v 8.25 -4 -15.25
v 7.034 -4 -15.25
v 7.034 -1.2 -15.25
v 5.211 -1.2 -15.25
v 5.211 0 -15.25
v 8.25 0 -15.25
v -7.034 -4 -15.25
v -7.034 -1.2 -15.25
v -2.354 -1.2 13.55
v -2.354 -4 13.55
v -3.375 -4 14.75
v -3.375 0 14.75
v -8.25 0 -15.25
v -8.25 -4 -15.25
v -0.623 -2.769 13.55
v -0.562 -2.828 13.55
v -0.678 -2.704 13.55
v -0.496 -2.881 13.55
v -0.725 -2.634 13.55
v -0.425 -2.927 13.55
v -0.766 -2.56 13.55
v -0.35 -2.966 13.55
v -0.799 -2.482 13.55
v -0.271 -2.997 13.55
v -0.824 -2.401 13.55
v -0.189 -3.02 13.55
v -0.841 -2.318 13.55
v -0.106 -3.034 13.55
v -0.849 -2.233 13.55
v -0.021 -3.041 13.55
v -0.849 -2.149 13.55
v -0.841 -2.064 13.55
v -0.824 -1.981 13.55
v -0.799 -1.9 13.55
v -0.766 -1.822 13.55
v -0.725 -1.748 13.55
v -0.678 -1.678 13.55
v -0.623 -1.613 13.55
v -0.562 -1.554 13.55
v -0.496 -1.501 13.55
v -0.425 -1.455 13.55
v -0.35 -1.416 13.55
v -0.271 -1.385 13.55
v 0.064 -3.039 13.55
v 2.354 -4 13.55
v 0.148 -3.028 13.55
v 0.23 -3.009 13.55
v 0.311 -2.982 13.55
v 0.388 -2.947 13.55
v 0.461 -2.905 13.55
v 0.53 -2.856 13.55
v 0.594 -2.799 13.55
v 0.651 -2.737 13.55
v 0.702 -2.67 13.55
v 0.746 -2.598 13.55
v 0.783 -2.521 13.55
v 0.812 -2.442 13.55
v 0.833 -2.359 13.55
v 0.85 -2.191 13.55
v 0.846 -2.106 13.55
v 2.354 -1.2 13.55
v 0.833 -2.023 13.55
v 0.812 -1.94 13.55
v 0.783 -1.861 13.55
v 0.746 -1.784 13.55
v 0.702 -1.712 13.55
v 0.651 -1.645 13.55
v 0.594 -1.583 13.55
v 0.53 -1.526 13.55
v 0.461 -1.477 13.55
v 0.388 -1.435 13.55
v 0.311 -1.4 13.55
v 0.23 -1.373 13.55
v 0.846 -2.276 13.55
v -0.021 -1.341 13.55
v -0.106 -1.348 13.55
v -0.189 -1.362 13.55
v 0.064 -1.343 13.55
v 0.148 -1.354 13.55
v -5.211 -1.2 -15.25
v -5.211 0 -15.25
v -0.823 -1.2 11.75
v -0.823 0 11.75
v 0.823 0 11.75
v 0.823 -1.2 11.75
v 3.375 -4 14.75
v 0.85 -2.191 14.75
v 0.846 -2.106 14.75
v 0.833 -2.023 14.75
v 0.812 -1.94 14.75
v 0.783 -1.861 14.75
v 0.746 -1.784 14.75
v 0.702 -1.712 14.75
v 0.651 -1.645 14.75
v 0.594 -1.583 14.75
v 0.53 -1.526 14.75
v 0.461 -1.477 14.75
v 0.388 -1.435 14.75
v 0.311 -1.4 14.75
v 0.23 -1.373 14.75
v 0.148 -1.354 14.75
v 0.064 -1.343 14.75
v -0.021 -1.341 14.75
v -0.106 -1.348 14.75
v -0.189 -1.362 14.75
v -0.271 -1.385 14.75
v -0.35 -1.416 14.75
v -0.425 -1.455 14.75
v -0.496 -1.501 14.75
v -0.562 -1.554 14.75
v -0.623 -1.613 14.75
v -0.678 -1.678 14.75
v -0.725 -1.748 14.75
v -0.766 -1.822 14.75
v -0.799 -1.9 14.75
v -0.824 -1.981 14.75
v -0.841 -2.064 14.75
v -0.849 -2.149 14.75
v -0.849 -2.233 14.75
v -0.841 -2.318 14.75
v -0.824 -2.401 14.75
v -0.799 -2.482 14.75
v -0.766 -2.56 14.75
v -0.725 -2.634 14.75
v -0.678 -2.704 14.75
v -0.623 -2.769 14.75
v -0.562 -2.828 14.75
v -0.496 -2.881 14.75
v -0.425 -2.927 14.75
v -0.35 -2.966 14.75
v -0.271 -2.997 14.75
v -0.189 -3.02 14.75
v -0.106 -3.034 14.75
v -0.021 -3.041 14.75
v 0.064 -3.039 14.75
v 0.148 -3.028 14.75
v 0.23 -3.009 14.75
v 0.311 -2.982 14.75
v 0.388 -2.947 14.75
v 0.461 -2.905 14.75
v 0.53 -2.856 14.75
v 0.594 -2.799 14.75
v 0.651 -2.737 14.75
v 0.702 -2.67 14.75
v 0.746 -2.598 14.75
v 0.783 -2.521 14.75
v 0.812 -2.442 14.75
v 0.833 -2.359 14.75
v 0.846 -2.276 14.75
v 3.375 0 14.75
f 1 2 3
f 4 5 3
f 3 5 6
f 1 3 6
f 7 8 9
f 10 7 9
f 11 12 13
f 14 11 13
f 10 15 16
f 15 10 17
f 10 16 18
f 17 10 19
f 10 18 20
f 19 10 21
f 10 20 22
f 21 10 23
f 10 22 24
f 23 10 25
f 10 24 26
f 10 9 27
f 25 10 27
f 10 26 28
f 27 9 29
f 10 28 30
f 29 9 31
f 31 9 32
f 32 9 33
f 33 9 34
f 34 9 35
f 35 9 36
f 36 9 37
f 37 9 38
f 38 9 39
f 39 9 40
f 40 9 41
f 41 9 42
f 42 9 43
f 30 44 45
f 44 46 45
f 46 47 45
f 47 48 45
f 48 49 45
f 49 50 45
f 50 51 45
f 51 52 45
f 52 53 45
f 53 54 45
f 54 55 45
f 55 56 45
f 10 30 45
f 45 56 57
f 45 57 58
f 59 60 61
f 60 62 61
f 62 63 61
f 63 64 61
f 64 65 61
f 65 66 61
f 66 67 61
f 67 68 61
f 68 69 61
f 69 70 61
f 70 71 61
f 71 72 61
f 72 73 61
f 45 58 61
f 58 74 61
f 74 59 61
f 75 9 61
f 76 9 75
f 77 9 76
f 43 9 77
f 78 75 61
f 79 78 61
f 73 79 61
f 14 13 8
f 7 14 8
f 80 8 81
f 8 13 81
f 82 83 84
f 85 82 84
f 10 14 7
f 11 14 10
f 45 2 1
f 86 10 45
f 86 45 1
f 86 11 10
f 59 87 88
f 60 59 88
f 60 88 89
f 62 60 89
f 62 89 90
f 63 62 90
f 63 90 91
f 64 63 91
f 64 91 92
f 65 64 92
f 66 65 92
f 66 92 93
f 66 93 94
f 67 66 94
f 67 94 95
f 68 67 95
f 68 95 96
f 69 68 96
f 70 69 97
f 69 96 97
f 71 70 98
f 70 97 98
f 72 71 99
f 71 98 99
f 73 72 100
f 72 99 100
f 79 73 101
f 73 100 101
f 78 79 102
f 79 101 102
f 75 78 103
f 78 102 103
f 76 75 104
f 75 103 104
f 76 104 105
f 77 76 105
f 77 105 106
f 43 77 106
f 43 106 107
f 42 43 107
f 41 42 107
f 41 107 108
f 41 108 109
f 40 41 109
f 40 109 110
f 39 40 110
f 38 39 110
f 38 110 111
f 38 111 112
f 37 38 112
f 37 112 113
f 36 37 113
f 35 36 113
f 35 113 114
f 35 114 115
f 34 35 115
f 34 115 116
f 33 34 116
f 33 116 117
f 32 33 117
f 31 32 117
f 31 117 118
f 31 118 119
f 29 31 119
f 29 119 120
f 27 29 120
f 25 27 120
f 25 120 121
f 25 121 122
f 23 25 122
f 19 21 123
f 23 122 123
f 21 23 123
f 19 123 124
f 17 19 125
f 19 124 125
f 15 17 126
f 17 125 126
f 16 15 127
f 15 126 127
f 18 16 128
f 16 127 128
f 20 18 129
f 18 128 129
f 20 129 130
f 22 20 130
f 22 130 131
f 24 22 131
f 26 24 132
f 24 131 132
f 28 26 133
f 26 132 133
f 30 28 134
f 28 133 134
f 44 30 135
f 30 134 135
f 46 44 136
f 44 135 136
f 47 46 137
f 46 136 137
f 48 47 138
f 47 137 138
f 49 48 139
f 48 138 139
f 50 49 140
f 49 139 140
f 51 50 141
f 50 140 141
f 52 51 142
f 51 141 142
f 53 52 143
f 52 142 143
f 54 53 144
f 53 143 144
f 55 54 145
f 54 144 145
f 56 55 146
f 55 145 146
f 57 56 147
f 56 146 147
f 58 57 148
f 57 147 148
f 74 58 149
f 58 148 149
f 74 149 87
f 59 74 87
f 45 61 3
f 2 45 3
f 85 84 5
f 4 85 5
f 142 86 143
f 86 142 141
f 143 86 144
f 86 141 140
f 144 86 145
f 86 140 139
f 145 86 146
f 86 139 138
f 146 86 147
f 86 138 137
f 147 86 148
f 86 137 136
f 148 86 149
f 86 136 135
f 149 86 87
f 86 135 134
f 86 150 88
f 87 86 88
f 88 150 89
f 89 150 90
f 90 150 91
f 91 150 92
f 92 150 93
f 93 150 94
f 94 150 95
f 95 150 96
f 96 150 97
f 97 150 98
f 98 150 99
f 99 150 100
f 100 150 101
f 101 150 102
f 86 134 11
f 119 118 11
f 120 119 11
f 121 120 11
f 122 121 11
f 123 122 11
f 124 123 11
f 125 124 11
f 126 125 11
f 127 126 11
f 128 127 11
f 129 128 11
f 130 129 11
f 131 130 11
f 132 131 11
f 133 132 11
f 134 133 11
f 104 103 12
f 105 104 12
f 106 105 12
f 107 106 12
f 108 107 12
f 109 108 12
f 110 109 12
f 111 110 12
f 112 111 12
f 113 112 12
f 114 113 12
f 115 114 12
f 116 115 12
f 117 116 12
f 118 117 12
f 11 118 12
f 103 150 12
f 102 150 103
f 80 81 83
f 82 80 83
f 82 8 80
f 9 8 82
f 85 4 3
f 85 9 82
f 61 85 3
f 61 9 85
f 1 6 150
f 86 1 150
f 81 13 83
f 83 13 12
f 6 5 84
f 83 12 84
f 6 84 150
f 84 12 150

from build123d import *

# Parameters (mm, degrees)
F1_DEPTH = 1.2
F2_DEPTH = 4
F3_R     = 0.85
F4_DEPTH = 1.5


with BuildPart() as f1:
    # F0 (on Front) → F1 (new body)
    with BuildSketch(Plane.XZ):
        Polygon((-2.354259, 13.55), (-7.034259, -15.25), (-5.210649, -15.25), (-0.823149, 11.75), (0.823149, 11.75), (5.210649, -15.25), (7.034259, -15.25), (2.354259, 13.55), align=None)
    extrude(amount=F1_DEPTH)

    # F0 (on Front) → F2 (join)
    with BuildSketch(Plane.XZ):
        Polygon((0, 14.75), (-3.375, 14.75), (-8.25, -15.25), (-7.034259, -15.25), (-2.354259, 13.55), (2.354259, 13.55), (7.034259, -15.25), (8.25, -15.25), (3.375, 14.75), align=None)
    extrude(amount=F2_DEPTH)

    # F3 (on face) → F4 (cut)
    with BuildSketch(Plane.XY.offset(14.75)):
        with Locations((0, -2.191013)):
            Circle(F3_R)
    extrude(amount=-F4_DEPTH, mode=Mode.SUBTRACT)


solid = f1.part
